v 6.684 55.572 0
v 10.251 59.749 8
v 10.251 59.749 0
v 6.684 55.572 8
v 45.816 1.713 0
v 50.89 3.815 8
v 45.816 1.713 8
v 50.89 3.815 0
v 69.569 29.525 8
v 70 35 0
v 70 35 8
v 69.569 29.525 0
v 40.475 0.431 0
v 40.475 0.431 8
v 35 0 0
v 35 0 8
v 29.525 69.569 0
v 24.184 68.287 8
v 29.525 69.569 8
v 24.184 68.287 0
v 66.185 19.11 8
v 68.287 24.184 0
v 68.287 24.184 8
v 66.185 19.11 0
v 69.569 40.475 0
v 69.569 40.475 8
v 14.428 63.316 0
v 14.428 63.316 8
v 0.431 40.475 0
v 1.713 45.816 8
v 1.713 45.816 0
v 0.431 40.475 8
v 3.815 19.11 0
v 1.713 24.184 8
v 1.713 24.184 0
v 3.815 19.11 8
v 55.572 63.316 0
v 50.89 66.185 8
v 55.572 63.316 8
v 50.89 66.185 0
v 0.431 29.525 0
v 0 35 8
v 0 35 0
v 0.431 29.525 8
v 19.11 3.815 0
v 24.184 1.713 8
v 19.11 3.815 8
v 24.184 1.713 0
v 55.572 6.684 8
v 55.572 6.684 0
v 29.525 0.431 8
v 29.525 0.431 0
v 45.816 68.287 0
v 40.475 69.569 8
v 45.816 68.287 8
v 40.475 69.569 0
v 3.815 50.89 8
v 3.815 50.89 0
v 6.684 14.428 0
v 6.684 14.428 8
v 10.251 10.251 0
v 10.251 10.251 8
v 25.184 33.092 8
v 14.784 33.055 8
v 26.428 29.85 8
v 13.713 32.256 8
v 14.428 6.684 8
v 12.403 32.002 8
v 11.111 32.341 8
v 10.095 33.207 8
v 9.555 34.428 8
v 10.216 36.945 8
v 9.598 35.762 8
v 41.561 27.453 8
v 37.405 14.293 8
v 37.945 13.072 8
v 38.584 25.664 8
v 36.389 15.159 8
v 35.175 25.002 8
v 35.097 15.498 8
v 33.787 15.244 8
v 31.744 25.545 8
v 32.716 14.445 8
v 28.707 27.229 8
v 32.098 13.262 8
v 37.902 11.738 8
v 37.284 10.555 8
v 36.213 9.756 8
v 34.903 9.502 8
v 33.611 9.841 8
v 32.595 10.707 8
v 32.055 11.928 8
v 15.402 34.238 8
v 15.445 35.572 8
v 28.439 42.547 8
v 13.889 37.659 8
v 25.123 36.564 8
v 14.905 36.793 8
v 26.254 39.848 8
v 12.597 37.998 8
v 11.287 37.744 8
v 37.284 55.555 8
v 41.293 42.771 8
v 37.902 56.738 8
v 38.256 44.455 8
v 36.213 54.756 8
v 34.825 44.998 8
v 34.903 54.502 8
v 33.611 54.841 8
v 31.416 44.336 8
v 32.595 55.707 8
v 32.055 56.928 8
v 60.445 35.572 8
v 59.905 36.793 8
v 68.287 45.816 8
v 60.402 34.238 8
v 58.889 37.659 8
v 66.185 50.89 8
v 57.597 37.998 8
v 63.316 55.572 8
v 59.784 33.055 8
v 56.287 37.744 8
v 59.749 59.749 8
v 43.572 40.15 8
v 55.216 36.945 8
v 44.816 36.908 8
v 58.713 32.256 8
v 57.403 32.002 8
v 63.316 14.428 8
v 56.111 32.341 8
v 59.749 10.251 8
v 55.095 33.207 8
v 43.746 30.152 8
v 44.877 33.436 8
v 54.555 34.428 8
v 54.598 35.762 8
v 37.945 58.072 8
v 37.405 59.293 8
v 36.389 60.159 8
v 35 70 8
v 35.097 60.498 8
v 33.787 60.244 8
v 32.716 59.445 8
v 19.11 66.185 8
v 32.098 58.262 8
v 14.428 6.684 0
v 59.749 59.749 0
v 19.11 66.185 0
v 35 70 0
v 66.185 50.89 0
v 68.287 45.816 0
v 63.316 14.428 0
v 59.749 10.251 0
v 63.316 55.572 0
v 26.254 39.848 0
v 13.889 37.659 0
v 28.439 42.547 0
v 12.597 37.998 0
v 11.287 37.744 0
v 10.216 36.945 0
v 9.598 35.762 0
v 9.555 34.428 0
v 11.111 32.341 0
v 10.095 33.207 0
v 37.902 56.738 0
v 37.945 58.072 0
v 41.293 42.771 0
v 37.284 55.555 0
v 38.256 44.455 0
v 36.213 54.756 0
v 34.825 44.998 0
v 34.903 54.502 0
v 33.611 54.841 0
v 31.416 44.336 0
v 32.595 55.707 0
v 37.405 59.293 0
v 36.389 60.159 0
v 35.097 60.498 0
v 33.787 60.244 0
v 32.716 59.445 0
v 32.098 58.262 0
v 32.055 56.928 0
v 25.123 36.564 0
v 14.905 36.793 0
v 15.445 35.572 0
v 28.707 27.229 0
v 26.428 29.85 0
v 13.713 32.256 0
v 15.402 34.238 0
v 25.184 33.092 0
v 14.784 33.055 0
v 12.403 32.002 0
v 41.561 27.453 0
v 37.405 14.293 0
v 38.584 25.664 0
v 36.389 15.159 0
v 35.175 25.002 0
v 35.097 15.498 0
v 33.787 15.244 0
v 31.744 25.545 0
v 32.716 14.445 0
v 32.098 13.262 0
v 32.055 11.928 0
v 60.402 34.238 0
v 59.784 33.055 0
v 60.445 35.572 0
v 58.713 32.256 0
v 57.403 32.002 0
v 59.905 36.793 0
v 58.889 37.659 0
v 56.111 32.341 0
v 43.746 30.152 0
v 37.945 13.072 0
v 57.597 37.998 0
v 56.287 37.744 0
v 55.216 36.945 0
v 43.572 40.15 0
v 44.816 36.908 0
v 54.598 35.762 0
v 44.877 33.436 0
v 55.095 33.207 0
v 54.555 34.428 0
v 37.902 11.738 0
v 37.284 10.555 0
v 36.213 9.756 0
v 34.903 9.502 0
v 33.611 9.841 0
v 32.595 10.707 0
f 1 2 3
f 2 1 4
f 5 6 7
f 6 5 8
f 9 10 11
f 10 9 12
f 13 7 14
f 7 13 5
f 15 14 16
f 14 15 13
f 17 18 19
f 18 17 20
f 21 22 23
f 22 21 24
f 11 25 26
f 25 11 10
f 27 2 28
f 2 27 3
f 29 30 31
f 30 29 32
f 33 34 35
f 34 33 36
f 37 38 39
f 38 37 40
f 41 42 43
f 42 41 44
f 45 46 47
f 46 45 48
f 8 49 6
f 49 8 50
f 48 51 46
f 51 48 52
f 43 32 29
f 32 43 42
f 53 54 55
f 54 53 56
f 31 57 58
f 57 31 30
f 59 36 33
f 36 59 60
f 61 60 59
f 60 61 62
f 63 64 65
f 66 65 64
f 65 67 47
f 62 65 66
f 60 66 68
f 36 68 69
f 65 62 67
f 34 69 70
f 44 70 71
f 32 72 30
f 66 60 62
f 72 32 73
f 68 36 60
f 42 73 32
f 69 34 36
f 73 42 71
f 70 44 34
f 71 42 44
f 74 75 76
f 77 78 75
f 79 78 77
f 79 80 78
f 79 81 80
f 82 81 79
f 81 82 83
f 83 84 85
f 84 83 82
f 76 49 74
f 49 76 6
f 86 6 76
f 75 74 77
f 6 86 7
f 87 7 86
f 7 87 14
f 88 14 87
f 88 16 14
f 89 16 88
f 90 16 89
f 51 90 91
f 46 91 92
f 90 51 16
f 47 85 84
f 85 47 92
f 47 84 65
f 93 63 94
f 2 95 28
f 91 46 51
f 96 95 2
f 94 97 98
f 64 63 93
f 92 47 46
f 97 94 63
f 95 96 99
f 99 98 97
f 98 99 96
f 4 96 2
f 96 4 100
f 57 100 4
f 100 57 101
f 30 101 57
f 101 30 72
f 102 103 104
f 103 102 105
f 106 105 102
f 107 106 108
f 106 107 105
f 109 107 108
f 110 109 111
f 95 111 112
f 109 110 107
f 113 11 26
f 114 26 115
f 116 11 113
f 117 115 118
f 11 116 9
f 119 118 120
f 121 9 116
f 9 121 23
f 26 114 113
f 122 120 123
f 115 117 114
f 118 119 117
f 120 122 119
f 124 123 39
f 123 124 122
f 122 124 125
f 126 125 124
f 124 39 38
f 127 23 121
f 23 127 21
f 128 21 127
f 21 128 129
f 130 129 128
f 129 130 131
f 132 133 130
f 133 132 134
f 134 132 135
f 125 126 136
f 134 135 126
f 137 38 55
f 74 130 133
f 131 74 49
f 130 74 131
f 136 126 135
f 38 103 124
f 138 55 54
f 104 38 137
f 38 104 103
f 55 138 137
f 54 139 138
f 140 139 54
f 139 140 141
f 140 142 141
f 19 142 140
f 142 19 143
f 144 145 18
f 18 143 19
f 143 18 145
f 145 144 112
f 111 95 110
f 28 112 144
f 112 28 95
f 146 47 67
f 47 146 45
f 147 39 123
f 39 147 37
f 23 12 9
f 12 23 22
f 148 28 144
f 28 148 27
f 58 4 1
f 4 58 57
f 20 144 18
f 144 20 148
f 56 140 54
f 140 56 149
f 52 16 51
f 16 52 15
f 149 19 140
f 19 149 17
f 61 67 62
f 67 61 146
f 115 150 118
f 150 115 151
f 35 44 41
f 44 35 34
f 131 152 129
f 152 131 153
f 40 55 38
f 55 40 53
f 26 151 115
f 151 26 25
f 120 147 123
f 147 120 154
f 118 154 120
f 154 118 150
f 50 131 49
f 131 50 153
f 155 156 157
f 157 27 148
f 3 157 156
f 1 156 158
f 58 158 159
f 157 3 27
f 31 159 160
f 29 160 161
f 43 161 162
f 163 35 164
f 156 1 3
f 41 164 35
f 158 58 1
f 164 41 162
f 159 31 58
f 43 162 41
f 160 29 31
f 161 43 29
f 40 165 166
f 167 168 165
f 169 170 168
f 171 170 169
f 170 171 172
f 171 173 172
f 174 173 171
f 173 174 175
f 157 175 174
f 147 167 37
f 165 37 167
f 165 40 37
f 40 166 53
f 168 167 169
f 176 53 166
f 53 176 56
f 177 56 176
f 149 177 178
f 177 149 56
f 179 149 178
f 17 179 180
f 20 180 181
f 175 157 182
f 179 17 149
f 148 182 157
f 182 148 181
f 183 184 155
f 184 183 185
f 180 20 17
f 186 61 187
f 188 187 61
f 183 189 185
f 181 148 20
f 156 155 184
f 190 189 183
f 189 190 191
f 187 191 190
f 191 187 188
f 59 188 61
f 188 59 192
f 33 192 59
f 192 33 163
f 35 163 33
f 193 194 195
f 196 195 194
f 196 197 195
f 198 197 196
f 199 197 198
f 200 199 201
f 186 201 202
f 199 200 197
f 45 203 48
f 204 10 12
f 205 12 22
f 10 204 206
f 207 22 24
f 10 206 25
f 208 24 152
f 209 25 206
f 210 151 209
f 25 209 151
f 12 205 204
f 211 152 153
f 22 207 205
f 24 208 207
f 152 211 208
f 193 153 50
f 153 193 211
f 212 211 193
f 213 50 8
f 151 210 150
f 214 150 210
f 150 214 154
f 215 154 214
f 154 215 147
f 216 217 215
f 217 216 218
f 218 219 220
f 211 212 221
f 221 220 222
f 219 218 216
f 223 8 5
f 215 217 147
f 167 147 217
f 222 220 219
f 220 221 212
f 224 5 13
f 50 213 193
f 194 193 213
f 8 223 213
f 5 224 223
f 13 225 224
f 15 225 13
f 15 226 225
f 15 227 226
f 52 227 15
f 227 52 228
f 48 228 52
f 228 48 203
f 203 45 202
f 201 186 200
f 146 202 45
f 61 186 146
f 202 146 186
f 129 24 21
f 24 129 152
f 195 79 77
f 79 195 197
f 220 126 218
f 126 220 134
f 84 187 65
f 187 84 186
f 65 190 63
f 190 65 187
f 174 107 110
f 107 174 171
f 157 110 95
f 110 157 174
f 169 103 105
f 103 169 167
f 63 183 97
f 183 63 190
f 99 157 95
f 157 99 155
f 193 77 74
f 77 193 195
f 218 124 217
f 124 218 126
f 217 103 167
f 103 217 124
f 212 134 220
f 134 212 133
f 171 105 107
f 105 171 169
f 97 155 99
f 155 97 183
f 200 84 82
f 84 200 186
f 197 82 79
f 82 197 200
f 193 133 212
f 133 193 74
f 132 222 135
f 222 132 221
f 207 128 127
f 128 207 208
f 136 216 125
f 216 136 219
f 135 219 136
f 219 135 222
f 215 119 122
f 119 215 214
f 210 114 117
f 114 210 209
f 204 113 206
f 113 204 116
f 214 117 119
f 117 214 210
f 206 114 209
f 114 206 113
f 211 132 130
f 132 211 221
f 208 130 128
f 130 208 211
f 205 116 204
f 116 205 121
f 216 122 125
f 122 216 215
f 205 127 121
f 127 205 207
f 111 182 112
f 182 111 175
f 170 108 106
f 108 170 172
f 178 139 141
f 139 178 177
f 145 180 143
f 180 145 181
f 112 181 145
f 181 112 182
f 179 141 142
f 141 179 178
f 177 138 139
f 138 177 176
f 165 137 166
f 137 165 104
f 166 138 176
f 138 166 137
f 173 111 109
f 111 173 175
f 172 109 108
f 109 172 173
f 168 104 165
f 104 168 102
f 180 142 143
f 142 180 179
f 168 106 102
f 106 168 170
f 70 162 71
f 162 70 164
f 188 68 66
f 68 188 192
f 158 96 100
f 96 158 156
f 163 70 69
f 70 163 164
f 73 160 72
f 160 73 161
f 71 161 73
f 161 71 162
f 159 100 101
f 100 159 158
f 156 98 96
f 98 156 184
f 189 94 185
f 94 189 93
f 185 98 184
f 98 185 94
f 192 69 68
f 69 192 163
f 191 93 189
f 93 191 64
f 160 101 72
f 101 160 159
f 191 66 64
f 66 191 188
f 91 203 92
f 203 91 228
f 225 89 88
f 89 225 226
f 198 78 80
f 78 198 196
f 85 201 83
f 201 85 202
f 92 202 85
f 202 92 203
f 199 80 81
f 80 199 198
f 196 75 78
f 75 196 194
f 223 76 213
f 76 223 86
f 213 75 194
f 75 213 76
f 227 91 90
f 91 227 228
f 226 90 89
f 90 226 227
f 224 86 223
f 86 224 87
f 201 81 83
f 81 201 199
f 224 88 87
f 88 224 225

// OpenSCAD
$fn = 32;

// ----------------------------------------------------------------------
// Spacer plate: round flange R35, 4 bolts
// ----------------------------------------------------------------------

// --- parameters (mm) ---
bore_r = 10;              // centre bore radius
bolt_r = 3;               // bolt hole radius
plate_t = 8;              // plate thickness, Z (extrusion height)
flange_r = 35;            // flange radius
n_bolt = 4;               // bolt hole count
ring_r = 22.5;            // bolt circle radius

profile = [[70, 35], [69.569, 40.475], [68.287, 45.816], [66.185, 50.89], [63.316, 55.572], [59.749, 59.749], [55.572, 63.316], [50.89, 66.185], [45.816, 68.287], [40.475, 69.569], [35, 70], [29.525, 69.569], [24.184, 68.287], [19.11, 66.185], [14.428, 63.316], [10.251, 59.749], [6.684, 55.572], [3.815, 50.89], [1.713, 45.816], [0.431, 40.475], [0, 35], [0.431, 29.525], [1.713, 24.184], [3.815, 19.11], [6.684, 14.428], [10.251, 10.251], [14.428, 6.684], [19.11, 3.815], [24.184, 1.713], [29.525, 0.431], [35, 0], [40.475, 0.431], [45.816, 1.713], [50.89, 3.815], [55.572, 6.684], [59.749, 10.251], [63.316, 14.428], [66.185, 19.11], [68.287, 24.184], [69.569, 29.525]];  // primary outline, 40 points, counter clockwise
void_1 = [[44.816, 36.908], [43.572, 40.15], [41.293, 42.771], [38.256, 44.455], [34.825, 44.998], [31.416, 44.336], [28.439, 42.547], [26.254, 39.848], [25.123, 36.564], [25.184, 33.092], [26.428, 29.85], [28.707, 27.229], [31.744, 25.545], [35.175, 25.002], [38.584, 25.664], [41.561, 27.453], [43.746, 30.152], [44.877, 33.436]];  // centre bore, 18 points
void_2 = [[60.445, 35.572], [59.905, 36.793], [58.889, 37.659], [57.597, 37.998], [56.287, 37.744], [55.216, 36.945], [54.598, 35.762], [54.555, 34.428], [55.095, 33.207], [56.111, 32.341], [57.403, 32.002], [58.713, 32.256], [59.784, 33.055], [60.402, 34.238]];  // bolt hole 1, 14 points
void_3 = [[37.945, 58.072], [37.405, 59.293], [36.389, 60.159], [35.097, 60.498], [33.787, 60.244], [32.716, 59.445], [32.098, 58.262], [32.055, 56.928], [32.595, 55.707], [33.611, 54.841], [34.903, 54.502], [36.213, 54.756], [37.284, 55.555], [37.902, 56.738]];  // bolt hole 2, 14 points
void_4 = [[15.445, 35.572], [14.905, 36.793], [13.889, 37.659], [12.597, 37.998], [11.287, 37.744], [10.216, 36.945], [9.598, 35.762], [9.555, 34.428], [10.095, 33.207], [11.111, 32.341], [12.403, 32.002], [13.713, 32.256], [14.784, 33.055], [15.402, 34.238]];  // bolt hole 3, 14 points
void_5 = [[37.945, 13.072], [37.405, 14.293], [36.389, 15.159], [35.097, 15.498], [33.787, 15.244], [32.716, 14.445], [32.098, 13.262], [32.055, 11.928], [32.595, 10.707], [33.611, 9.841], [34.903, 9.502], [36.213, 9.756], [37.284, 10.555], [37.902, 11.738]];  // bolt hole 4, 14 points

// --- the one profile operation ---
difference() {
  linear_extrude(height = plate_t) polygon(points = profile);
  translate([0, 0, -1])
    linear_extrude(height = plate_t + 2) polygon(points = void_1);
  translate([0, 0, -1])
    linear_extrude(height = plate_t + 2) polygon(points = void_2);
  translate([0, 0, -1])
    linear_extrude(height = plate_t + 2) polygon(points = void_3);
  translate([0, 0, -1])
    linear_extrude(height = plate_t + 2) polygon(points = void_4);
  translate([0, 0, -1])
    linear_extrude(height = plate_t + 2) polygon(points = void_5);
}
